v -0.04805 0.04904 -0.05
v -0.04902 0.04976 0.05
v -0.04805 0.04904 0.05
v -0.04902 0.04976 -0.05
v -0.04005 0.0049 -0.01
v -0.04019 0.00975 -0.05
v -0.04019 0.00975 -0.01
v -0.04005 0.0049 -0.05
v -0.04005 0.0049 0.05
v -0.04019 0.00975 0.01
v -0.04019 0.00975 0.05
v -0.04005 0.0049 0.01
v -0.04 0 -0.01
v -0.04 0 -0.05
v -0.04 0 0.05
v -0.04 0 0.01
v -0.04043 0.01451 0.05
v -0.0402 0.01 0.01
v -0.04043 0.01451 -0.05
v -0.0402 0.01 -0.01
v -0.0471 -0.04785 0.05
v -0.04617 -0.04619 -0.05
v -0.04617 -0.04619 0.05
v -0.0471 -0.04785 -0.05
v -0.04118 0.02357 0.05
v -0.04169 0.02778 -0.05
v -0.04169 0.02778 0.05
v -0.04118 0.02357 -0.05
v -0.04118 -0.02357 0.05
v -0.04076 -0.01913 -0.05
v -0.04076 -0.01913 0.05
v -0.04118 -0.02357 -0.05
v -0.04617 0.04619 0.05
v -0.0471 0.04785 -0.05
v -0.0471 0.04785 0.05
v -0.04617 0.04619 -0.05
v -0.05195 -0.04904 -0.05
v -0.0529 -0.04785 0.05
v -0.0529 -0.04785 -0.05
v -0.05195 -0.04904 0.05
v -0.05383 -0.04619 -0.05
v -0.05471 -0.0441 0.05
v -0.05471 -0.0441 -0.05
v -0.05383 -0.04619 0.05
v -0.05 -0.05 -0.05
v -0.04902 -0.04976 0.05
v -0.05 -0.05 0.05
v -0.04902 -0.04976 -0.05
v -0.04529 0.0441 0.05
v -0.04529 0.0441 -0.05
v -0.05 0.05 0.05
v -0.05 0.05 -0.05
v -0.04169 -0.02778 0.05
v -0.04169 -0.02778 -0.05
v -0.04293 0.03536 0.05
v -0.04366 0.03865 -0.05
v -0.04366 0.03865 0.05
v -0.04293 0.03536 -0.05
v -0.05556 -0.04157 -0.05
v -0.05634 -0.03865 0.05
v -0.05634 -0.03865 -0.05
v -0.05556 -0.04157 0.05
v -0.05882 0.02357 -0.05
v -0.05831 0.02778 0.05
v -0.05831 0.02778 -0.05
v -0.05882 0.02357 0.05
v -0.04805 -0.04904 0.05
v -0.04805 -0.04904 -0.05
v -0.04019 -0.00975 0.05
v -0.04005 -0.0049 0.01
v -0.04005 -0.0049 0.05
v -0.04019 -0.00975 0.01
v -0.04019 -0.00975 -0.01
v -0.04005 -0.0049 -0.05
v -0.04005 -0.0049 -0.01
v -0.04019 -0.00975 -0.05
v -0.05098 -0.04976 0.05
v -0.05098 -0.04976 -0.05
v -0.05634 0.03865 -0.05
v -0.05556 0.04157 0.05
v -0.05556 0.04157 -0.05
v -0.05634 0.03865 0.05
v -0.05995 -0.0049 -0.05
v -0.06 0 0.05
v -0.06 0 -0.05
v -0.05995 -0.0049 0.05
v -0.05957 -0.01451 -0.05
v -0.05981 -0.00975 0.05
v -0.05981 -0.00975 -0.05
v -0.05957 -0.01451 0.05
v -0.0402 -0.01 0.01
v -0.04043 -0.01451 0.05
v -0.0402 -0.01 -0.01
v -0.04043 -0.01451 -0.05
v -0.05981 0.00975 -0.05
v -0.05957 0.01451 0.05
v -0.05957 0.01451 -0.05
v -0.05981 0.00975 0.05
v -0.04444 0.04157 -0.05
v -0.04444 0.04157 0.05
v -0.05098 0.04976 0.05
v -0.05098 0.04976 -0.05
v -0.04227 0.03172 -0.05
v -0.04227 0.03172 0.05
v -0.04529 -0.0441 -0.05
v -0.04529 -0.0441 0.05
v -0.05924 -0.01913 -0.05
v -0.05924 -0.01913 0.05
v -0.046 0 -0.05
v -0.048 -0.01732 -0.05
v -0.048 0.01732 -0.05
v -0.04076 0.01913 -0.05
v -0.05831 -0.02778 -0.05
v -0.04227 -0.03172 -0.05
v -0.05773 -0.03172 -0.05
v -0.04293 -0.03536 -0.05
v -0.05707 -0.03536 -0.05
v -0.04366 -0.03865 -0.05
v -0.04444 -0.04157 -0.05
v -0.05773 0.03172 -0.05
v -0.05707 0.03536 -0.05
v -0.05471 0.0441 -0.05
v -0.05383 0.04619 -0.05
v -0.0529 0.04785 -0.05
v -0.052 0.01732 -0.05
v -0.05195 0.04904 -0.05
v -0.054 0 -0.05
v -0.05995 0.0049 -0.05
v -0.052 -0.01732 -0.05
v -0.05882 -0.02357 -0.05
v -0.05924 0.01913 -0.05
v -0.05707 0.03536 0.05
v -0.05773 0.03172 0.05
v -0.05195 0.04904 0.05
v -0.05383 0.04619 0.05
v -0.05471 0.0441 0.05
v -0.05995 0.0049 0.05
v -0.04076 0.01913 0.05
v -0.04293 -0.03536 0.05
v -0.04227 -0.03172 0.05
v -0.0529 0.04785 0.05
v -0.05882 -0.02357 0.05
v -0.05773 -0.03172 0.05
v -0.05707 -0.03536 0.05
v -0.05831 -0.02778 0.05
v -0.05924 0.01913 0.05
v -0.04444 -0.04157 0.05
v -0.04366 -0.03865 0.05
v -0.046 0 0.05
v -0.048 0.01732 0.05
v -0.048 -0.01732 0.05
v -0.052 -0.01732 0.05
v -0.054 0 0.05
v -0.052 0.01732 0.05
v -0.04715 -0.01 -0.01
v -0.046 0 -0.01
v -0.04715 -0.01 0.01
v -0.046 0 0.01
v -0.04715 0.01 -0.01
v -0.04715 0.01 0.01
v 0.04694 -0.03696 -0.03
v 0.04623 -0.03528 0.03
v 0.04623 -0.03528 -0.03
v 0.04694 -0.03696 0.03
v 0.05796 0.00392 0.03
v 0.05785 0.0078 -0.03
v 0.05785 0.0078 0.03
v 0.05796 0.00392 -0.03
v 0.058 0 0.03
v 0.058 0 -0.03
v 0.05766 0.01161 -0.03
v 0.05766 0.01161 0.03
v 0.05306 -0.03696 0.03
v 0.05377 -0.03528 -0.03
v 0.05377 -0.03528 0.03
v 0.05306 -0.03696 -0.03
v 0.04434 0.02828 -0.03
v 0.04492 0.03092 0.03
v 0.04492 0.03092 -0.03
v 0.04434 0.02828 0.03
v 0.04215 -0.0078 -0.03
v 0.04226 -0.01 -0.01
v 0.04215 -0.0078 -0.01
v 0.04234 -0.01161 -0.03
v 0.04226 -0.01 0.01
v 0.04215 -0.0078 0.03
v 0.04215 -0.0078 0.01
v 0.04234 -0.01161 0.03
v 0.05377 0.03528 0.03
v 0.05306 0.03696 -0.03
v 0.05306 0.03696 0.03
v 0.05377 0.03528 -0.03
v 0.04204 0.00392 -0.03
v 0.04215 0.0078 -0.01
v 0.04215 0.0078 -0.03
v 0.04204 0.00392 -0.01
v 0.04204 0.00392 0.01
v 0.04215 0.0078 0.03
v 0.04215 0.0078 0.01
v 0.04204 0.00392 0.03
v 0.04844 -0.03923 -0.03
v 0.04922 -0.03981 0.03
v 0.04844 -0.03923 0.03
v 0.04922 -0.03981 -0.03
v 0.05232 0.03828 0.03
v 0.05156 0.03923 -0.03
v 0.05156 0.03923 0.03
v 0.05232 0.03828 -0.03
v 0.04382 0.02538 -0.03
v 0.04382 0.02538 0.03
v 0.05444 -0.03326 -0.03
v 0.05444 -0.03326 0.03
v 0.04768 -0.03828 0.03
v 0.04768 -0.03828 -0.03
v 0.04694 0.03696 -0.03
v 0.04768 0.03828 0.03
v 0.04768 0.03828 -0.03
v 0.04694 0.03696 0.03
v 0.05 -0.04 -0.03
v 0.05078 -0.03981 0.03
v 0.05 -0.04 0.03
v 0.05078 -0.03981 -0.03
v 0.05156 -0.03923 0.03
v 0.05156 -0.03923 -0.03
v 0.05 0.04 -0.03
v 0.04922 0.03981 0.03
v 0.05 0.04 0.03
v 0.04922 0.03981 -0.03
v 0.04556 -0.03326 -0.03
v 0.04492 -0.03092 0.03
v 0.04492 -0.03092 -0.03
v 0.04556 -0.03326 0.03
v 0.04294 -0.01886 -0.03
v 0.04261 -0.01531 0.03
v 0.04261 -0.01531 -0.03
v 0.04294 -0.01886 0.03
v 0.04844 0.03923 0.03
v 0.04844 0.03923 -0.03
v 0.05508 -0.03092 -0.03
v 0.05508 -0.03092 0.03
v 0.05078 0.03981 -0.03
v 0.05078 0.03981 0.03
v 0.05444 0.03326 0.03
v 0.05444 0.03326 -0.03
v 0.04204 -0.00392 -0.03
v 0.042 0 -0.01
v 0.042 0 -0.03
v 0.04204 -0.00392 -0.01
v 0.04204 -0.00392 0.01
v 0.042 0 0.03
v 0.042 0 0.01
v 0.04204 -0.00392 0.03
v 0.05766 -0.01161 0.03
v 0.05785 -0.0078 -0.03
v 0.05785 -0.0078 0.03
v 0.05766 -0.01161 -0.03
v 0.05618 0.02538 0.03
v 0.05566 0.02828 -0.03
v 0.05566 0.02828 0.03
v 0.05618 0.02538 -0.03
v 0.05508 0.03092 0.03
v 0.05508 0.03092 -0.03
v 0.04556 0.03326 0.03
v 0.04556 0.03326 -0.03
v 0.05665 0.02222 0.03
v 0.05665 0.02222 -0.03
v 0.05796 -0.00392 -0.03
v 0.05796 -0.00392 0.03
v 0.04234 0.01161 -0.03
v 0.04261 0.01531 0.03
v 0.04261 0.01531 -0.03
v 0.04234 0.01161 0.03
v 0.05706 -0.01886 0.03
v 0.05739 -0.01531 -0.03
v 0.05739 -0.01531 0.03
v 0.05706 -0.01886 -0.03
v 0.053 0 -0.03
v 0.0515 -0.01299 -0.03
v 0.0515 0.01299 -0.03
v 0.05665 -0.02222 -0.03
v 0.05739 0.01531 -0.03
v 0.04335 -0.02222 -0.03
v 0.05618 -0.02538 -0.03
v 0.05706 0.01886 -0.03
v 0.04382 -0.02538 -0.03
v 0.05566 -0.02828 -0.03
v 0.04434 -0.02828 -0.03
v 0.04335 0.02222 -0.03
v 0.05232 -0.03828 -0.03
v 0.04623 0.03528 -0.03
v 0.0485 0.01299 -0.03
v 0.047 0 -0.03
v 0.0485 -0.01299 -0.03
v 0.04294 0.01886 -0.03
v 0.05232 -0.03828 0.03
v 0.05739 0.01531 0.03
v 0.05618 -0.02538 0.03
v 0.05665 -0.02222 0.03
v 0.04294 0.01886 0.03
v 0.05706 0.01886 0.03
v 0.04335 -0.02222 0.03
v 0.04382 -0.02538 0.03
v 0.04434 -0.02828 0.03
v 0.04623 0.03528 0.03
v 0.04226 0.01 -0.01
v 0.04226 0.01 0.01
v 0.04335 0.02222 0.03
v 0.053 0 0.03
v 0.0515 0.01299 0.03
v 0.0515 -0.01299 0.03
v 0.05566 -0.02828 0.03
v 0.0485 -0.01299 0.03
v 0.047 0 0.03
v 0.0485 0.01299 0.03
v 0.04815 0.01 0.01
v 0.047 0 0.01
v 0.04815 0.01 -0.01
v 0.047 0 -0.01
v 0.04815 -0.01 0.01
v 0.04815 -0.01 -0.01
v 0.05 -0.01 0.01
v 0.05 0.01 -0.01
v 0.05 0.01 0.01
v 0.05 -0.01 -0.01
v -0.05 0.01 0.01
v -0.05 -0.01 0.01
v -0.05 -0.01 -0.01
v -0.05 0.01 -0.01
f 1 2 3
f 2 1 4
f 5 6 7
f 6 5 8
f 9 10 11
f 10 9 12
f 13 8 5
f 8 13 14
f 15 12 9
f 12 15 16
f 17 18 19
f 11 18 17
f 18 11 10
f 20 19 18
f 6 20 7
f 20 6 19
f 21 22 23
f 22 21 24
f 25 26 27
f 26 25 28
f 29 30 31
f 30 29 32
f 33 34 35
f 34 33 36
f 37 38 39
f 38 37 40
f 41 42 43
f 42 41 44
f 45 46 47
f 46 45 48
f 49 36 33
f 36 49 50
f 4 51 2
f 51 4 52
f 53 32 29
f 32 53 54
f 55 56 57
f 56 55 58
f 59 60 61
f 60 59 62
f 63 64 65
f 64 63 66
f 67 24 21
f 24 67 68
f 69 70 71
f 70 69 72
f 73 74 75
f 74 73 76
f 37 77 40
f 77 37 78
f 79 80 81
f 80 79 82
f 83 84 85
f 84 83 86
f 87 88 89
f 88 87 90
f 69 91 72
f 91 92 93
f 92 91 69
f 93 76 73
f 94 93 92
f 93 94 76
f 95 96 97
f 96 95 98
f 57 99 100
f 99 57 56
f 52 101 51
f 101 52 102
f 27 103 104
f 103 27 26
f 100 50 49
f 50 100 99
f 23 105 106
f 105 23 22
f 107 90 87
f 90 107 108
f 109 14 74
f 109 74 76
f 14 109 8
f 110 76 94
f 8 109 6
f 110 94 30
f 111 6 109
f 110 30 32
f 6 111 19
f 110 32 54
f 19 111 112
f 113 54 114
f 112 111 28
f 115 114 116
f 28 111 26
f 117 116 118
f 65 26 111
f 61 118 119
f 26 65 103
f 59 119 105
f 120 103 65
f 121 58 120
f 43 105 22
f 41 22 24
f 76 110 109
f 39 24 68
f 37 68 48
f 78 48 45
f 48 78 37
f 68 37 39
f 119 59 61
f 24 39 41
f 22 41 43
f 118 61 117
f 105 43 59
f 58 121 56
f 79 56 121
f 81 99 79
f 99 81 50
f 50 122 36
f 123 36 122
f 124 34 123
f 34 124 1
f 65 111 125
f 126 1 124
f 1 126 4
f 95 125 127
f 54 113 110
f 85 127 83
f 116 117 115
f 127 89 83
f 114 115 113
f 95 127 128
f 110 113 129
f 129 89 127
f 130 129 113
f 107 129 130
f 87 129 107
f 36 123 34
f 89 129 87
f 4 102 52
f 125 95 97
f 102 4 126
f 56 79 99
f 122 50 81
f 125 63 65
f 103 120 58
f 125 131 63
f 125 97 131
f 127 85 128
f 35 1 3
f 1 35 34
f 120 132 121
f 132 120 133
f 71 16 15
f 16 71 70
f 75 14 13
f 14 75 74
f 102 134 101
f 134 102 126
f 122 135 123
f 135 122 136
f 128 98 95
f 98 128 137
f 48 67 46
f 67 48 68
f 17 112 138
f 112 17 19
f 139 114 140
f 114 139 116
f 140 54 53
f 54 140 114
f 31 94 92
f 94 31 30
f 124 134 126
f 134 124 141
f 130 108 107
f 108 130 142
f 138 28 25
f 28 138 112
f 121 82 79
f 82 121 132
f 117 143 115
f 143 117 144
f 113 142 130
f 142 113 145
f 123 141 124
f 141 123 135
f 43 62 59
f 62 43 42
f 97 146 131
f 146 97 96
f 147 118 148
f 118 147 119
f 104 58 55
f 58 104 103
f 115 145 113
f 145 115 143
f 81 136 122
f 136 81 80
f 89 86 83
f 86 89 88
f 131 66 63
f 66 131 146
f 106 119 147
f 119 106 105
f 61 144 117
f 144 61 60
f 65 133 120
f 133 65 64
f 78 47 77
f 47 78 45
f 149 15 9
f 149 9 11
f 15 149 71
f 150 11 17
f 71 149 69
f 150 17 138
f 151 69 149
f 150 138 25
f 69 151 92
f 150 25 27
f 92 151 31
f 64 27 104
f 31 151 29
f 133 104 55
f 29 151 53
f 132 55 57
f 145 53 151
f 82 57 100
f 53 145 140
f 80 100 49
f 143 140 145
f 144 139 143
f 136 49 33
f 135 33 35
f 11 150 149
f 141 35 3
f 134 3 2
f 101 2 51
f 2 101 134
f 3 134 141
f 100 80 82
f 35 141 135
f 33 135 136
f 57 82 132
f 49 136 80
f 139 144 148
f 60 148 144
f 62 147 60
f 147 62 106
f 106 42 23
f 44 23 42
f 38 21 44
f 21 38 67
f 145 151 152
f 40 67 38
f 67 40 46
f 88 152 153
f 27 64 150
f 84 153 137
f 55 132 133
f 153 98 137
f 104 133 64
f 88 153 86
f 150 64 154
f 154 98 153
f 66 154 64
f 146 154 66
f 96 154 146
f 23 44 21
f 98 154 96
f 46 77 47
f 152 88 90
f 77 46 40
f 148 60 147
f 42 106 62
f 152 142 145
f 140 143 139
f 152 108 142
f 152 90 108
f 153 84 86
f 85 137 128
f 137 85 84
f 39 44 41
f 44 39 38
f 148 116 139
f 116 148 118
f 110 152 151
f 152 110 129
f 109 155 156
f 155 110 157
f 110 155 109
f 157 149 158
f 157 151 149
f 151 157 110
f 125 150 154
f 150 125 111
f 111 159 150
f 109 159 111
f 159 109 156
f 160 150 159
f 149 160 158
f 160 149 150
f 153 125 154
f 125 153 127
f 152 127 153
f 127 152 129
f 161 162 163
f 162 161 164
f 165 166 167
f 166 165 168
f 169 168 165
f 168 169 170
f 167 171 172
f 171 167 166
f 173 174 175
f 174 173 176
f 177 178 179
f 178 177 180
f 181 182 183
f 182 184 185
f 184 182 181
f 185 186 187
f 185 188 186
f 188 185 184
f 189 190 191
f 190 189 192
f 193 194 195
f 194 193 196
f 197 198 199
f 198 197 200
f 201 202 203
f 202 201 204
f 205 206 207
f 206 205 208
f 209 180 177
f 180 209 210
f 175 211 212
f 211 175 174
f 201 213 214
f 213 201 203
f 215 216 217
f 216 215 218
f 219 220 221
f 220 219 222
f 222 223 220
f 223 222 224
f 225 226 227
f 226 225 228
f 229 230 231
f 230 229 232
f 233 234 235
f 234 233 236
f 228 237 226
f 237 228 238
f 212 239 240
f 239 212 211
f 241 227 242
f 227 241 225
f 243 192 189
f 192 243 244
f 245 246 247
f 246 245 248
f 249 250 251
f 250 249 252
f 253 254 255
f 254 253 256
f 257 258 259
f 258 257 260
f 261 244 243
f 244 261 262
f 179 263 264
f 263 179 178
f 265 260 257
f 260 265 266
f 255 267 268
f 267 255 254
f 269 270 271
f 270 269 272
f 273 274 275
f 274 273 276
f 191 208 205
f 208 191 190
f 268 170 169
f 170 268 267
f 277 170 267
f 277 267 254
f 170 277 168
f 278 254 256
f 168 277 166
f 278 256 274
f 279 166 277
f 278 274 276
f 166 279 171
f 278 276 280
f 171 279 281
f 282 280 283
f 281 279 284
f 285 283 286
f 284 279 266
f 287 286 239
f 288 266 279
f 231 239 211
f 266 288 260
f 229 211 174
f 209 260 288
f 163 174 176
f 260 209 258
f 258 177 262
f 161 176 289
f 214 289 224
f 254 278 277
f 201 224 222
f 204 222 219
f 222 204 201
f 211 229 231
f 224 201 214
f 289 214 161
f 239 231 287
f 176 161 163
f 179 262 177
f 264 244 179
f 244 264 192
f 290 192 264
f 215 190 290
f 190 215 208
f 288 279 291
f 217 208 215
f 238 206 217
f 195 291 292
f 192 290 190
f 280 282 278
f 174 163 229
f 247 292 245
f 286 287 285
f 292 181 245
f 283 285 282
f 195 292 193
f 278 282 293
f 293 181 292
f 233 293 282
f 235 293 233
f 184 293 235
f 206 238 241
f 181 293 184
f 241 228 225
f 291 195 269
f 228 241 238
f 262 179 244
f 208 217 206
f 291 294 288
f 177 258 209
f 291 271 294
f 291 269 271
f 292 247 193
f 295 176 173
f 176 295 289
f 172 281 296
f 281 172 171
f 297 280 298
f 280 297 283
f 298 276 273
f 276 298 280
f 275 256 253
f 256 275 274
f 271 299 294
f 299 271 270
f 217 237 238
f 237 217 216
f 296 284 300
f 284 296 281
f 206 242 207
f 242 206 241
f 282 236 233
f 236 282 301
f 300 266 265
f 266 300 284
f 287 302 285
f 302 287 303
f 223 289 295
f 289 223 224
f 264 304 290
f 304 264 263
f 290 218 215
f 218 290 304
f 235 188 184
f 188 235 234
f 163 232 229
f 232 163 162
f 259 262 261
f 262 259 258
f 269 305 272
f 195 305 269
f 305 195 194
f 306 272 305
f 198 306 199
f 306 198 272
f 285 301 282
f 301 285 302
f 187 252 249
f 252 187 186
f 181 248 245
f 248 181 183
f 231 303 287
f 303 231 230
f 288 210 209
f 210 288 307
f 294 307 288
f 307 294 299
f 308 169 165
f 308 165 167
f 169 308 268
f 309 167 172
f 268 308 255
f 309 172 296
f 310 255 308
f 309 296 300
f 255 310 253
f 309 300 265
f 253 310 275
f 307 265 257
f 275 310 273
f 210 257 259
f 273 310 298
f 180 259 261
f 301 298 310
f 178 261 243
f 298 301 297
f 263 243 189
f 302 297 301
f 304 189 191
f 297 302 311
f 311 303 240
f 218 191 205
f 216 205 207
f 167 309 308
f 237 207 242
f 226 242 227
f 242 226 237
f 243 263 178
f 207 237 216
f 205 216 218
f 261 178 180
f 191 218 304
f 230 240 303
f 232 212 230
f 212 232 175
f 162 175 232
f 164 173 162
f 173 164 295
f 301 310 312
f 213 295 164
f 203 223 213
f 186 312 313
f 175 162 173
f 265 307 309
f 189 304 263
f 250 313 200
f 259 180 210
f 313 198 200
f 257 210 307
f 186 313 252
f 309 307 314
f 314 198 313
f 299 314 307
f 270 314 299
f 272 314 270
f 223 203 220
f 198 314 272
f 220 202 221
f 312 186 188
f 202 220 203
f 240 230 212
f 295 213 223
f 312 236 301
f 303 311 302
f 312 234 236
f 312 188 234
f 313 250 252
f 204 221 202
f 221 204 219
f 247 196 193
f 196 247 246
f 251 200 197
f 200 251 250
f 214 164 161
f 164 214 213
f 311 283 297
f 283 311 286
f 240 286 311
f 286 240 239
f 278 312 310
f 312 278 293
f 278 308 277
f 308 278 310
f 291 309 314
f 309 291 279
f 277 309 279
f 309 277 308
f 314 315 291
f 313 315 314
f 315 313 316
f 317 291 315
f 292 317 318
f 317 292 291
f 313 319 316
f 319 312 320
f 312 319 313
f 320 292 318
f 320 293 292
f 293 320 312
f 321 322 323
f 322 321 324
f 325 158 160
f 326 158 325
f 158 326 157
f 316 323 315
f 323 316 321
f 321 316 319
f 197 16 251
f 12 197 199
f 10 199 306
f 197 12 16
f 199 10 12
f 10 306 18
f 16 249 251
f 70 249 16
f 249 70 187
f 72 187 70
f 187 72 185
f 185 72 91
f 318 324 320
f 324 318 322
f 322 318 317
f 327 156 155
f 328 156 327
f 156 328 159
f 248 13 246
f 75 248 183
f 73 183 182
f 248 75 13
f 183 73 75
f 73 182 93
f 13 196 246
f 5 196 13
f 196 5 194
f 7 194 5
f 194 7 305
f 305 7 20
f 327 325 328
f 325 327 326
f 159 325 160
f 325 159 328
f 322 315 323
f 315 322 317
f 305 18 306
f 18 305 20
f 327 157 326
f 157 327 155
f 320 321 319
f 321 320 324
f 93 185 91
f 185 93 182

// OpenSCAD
module hex_hole(radius, height) {
    translate([0, 0, -height/2])
        cylinder(r=radius, h=height, $fn=6);
}

module boss(diameter, thickness, hex_radius) {
    difference() {
        translate([0, 0, -thickness/2])
            cylinder(d=diameter, h=thickness, $fn=64);
        hex_hole(hex_radius, thickness + 1);
    }
}

module offset_link() {
    union() {
        translate([-25, 0, 0])
            boss(10, 5, 2);
        translate([25, 0, 0])
            boss(8, 3, 1.5);
        translate([-25, -1, -0.5])
            cube([50, 2, 1]);
    }
}

scale([0.1/50, 0.1/10, 0.1/5])
    offset_link();
